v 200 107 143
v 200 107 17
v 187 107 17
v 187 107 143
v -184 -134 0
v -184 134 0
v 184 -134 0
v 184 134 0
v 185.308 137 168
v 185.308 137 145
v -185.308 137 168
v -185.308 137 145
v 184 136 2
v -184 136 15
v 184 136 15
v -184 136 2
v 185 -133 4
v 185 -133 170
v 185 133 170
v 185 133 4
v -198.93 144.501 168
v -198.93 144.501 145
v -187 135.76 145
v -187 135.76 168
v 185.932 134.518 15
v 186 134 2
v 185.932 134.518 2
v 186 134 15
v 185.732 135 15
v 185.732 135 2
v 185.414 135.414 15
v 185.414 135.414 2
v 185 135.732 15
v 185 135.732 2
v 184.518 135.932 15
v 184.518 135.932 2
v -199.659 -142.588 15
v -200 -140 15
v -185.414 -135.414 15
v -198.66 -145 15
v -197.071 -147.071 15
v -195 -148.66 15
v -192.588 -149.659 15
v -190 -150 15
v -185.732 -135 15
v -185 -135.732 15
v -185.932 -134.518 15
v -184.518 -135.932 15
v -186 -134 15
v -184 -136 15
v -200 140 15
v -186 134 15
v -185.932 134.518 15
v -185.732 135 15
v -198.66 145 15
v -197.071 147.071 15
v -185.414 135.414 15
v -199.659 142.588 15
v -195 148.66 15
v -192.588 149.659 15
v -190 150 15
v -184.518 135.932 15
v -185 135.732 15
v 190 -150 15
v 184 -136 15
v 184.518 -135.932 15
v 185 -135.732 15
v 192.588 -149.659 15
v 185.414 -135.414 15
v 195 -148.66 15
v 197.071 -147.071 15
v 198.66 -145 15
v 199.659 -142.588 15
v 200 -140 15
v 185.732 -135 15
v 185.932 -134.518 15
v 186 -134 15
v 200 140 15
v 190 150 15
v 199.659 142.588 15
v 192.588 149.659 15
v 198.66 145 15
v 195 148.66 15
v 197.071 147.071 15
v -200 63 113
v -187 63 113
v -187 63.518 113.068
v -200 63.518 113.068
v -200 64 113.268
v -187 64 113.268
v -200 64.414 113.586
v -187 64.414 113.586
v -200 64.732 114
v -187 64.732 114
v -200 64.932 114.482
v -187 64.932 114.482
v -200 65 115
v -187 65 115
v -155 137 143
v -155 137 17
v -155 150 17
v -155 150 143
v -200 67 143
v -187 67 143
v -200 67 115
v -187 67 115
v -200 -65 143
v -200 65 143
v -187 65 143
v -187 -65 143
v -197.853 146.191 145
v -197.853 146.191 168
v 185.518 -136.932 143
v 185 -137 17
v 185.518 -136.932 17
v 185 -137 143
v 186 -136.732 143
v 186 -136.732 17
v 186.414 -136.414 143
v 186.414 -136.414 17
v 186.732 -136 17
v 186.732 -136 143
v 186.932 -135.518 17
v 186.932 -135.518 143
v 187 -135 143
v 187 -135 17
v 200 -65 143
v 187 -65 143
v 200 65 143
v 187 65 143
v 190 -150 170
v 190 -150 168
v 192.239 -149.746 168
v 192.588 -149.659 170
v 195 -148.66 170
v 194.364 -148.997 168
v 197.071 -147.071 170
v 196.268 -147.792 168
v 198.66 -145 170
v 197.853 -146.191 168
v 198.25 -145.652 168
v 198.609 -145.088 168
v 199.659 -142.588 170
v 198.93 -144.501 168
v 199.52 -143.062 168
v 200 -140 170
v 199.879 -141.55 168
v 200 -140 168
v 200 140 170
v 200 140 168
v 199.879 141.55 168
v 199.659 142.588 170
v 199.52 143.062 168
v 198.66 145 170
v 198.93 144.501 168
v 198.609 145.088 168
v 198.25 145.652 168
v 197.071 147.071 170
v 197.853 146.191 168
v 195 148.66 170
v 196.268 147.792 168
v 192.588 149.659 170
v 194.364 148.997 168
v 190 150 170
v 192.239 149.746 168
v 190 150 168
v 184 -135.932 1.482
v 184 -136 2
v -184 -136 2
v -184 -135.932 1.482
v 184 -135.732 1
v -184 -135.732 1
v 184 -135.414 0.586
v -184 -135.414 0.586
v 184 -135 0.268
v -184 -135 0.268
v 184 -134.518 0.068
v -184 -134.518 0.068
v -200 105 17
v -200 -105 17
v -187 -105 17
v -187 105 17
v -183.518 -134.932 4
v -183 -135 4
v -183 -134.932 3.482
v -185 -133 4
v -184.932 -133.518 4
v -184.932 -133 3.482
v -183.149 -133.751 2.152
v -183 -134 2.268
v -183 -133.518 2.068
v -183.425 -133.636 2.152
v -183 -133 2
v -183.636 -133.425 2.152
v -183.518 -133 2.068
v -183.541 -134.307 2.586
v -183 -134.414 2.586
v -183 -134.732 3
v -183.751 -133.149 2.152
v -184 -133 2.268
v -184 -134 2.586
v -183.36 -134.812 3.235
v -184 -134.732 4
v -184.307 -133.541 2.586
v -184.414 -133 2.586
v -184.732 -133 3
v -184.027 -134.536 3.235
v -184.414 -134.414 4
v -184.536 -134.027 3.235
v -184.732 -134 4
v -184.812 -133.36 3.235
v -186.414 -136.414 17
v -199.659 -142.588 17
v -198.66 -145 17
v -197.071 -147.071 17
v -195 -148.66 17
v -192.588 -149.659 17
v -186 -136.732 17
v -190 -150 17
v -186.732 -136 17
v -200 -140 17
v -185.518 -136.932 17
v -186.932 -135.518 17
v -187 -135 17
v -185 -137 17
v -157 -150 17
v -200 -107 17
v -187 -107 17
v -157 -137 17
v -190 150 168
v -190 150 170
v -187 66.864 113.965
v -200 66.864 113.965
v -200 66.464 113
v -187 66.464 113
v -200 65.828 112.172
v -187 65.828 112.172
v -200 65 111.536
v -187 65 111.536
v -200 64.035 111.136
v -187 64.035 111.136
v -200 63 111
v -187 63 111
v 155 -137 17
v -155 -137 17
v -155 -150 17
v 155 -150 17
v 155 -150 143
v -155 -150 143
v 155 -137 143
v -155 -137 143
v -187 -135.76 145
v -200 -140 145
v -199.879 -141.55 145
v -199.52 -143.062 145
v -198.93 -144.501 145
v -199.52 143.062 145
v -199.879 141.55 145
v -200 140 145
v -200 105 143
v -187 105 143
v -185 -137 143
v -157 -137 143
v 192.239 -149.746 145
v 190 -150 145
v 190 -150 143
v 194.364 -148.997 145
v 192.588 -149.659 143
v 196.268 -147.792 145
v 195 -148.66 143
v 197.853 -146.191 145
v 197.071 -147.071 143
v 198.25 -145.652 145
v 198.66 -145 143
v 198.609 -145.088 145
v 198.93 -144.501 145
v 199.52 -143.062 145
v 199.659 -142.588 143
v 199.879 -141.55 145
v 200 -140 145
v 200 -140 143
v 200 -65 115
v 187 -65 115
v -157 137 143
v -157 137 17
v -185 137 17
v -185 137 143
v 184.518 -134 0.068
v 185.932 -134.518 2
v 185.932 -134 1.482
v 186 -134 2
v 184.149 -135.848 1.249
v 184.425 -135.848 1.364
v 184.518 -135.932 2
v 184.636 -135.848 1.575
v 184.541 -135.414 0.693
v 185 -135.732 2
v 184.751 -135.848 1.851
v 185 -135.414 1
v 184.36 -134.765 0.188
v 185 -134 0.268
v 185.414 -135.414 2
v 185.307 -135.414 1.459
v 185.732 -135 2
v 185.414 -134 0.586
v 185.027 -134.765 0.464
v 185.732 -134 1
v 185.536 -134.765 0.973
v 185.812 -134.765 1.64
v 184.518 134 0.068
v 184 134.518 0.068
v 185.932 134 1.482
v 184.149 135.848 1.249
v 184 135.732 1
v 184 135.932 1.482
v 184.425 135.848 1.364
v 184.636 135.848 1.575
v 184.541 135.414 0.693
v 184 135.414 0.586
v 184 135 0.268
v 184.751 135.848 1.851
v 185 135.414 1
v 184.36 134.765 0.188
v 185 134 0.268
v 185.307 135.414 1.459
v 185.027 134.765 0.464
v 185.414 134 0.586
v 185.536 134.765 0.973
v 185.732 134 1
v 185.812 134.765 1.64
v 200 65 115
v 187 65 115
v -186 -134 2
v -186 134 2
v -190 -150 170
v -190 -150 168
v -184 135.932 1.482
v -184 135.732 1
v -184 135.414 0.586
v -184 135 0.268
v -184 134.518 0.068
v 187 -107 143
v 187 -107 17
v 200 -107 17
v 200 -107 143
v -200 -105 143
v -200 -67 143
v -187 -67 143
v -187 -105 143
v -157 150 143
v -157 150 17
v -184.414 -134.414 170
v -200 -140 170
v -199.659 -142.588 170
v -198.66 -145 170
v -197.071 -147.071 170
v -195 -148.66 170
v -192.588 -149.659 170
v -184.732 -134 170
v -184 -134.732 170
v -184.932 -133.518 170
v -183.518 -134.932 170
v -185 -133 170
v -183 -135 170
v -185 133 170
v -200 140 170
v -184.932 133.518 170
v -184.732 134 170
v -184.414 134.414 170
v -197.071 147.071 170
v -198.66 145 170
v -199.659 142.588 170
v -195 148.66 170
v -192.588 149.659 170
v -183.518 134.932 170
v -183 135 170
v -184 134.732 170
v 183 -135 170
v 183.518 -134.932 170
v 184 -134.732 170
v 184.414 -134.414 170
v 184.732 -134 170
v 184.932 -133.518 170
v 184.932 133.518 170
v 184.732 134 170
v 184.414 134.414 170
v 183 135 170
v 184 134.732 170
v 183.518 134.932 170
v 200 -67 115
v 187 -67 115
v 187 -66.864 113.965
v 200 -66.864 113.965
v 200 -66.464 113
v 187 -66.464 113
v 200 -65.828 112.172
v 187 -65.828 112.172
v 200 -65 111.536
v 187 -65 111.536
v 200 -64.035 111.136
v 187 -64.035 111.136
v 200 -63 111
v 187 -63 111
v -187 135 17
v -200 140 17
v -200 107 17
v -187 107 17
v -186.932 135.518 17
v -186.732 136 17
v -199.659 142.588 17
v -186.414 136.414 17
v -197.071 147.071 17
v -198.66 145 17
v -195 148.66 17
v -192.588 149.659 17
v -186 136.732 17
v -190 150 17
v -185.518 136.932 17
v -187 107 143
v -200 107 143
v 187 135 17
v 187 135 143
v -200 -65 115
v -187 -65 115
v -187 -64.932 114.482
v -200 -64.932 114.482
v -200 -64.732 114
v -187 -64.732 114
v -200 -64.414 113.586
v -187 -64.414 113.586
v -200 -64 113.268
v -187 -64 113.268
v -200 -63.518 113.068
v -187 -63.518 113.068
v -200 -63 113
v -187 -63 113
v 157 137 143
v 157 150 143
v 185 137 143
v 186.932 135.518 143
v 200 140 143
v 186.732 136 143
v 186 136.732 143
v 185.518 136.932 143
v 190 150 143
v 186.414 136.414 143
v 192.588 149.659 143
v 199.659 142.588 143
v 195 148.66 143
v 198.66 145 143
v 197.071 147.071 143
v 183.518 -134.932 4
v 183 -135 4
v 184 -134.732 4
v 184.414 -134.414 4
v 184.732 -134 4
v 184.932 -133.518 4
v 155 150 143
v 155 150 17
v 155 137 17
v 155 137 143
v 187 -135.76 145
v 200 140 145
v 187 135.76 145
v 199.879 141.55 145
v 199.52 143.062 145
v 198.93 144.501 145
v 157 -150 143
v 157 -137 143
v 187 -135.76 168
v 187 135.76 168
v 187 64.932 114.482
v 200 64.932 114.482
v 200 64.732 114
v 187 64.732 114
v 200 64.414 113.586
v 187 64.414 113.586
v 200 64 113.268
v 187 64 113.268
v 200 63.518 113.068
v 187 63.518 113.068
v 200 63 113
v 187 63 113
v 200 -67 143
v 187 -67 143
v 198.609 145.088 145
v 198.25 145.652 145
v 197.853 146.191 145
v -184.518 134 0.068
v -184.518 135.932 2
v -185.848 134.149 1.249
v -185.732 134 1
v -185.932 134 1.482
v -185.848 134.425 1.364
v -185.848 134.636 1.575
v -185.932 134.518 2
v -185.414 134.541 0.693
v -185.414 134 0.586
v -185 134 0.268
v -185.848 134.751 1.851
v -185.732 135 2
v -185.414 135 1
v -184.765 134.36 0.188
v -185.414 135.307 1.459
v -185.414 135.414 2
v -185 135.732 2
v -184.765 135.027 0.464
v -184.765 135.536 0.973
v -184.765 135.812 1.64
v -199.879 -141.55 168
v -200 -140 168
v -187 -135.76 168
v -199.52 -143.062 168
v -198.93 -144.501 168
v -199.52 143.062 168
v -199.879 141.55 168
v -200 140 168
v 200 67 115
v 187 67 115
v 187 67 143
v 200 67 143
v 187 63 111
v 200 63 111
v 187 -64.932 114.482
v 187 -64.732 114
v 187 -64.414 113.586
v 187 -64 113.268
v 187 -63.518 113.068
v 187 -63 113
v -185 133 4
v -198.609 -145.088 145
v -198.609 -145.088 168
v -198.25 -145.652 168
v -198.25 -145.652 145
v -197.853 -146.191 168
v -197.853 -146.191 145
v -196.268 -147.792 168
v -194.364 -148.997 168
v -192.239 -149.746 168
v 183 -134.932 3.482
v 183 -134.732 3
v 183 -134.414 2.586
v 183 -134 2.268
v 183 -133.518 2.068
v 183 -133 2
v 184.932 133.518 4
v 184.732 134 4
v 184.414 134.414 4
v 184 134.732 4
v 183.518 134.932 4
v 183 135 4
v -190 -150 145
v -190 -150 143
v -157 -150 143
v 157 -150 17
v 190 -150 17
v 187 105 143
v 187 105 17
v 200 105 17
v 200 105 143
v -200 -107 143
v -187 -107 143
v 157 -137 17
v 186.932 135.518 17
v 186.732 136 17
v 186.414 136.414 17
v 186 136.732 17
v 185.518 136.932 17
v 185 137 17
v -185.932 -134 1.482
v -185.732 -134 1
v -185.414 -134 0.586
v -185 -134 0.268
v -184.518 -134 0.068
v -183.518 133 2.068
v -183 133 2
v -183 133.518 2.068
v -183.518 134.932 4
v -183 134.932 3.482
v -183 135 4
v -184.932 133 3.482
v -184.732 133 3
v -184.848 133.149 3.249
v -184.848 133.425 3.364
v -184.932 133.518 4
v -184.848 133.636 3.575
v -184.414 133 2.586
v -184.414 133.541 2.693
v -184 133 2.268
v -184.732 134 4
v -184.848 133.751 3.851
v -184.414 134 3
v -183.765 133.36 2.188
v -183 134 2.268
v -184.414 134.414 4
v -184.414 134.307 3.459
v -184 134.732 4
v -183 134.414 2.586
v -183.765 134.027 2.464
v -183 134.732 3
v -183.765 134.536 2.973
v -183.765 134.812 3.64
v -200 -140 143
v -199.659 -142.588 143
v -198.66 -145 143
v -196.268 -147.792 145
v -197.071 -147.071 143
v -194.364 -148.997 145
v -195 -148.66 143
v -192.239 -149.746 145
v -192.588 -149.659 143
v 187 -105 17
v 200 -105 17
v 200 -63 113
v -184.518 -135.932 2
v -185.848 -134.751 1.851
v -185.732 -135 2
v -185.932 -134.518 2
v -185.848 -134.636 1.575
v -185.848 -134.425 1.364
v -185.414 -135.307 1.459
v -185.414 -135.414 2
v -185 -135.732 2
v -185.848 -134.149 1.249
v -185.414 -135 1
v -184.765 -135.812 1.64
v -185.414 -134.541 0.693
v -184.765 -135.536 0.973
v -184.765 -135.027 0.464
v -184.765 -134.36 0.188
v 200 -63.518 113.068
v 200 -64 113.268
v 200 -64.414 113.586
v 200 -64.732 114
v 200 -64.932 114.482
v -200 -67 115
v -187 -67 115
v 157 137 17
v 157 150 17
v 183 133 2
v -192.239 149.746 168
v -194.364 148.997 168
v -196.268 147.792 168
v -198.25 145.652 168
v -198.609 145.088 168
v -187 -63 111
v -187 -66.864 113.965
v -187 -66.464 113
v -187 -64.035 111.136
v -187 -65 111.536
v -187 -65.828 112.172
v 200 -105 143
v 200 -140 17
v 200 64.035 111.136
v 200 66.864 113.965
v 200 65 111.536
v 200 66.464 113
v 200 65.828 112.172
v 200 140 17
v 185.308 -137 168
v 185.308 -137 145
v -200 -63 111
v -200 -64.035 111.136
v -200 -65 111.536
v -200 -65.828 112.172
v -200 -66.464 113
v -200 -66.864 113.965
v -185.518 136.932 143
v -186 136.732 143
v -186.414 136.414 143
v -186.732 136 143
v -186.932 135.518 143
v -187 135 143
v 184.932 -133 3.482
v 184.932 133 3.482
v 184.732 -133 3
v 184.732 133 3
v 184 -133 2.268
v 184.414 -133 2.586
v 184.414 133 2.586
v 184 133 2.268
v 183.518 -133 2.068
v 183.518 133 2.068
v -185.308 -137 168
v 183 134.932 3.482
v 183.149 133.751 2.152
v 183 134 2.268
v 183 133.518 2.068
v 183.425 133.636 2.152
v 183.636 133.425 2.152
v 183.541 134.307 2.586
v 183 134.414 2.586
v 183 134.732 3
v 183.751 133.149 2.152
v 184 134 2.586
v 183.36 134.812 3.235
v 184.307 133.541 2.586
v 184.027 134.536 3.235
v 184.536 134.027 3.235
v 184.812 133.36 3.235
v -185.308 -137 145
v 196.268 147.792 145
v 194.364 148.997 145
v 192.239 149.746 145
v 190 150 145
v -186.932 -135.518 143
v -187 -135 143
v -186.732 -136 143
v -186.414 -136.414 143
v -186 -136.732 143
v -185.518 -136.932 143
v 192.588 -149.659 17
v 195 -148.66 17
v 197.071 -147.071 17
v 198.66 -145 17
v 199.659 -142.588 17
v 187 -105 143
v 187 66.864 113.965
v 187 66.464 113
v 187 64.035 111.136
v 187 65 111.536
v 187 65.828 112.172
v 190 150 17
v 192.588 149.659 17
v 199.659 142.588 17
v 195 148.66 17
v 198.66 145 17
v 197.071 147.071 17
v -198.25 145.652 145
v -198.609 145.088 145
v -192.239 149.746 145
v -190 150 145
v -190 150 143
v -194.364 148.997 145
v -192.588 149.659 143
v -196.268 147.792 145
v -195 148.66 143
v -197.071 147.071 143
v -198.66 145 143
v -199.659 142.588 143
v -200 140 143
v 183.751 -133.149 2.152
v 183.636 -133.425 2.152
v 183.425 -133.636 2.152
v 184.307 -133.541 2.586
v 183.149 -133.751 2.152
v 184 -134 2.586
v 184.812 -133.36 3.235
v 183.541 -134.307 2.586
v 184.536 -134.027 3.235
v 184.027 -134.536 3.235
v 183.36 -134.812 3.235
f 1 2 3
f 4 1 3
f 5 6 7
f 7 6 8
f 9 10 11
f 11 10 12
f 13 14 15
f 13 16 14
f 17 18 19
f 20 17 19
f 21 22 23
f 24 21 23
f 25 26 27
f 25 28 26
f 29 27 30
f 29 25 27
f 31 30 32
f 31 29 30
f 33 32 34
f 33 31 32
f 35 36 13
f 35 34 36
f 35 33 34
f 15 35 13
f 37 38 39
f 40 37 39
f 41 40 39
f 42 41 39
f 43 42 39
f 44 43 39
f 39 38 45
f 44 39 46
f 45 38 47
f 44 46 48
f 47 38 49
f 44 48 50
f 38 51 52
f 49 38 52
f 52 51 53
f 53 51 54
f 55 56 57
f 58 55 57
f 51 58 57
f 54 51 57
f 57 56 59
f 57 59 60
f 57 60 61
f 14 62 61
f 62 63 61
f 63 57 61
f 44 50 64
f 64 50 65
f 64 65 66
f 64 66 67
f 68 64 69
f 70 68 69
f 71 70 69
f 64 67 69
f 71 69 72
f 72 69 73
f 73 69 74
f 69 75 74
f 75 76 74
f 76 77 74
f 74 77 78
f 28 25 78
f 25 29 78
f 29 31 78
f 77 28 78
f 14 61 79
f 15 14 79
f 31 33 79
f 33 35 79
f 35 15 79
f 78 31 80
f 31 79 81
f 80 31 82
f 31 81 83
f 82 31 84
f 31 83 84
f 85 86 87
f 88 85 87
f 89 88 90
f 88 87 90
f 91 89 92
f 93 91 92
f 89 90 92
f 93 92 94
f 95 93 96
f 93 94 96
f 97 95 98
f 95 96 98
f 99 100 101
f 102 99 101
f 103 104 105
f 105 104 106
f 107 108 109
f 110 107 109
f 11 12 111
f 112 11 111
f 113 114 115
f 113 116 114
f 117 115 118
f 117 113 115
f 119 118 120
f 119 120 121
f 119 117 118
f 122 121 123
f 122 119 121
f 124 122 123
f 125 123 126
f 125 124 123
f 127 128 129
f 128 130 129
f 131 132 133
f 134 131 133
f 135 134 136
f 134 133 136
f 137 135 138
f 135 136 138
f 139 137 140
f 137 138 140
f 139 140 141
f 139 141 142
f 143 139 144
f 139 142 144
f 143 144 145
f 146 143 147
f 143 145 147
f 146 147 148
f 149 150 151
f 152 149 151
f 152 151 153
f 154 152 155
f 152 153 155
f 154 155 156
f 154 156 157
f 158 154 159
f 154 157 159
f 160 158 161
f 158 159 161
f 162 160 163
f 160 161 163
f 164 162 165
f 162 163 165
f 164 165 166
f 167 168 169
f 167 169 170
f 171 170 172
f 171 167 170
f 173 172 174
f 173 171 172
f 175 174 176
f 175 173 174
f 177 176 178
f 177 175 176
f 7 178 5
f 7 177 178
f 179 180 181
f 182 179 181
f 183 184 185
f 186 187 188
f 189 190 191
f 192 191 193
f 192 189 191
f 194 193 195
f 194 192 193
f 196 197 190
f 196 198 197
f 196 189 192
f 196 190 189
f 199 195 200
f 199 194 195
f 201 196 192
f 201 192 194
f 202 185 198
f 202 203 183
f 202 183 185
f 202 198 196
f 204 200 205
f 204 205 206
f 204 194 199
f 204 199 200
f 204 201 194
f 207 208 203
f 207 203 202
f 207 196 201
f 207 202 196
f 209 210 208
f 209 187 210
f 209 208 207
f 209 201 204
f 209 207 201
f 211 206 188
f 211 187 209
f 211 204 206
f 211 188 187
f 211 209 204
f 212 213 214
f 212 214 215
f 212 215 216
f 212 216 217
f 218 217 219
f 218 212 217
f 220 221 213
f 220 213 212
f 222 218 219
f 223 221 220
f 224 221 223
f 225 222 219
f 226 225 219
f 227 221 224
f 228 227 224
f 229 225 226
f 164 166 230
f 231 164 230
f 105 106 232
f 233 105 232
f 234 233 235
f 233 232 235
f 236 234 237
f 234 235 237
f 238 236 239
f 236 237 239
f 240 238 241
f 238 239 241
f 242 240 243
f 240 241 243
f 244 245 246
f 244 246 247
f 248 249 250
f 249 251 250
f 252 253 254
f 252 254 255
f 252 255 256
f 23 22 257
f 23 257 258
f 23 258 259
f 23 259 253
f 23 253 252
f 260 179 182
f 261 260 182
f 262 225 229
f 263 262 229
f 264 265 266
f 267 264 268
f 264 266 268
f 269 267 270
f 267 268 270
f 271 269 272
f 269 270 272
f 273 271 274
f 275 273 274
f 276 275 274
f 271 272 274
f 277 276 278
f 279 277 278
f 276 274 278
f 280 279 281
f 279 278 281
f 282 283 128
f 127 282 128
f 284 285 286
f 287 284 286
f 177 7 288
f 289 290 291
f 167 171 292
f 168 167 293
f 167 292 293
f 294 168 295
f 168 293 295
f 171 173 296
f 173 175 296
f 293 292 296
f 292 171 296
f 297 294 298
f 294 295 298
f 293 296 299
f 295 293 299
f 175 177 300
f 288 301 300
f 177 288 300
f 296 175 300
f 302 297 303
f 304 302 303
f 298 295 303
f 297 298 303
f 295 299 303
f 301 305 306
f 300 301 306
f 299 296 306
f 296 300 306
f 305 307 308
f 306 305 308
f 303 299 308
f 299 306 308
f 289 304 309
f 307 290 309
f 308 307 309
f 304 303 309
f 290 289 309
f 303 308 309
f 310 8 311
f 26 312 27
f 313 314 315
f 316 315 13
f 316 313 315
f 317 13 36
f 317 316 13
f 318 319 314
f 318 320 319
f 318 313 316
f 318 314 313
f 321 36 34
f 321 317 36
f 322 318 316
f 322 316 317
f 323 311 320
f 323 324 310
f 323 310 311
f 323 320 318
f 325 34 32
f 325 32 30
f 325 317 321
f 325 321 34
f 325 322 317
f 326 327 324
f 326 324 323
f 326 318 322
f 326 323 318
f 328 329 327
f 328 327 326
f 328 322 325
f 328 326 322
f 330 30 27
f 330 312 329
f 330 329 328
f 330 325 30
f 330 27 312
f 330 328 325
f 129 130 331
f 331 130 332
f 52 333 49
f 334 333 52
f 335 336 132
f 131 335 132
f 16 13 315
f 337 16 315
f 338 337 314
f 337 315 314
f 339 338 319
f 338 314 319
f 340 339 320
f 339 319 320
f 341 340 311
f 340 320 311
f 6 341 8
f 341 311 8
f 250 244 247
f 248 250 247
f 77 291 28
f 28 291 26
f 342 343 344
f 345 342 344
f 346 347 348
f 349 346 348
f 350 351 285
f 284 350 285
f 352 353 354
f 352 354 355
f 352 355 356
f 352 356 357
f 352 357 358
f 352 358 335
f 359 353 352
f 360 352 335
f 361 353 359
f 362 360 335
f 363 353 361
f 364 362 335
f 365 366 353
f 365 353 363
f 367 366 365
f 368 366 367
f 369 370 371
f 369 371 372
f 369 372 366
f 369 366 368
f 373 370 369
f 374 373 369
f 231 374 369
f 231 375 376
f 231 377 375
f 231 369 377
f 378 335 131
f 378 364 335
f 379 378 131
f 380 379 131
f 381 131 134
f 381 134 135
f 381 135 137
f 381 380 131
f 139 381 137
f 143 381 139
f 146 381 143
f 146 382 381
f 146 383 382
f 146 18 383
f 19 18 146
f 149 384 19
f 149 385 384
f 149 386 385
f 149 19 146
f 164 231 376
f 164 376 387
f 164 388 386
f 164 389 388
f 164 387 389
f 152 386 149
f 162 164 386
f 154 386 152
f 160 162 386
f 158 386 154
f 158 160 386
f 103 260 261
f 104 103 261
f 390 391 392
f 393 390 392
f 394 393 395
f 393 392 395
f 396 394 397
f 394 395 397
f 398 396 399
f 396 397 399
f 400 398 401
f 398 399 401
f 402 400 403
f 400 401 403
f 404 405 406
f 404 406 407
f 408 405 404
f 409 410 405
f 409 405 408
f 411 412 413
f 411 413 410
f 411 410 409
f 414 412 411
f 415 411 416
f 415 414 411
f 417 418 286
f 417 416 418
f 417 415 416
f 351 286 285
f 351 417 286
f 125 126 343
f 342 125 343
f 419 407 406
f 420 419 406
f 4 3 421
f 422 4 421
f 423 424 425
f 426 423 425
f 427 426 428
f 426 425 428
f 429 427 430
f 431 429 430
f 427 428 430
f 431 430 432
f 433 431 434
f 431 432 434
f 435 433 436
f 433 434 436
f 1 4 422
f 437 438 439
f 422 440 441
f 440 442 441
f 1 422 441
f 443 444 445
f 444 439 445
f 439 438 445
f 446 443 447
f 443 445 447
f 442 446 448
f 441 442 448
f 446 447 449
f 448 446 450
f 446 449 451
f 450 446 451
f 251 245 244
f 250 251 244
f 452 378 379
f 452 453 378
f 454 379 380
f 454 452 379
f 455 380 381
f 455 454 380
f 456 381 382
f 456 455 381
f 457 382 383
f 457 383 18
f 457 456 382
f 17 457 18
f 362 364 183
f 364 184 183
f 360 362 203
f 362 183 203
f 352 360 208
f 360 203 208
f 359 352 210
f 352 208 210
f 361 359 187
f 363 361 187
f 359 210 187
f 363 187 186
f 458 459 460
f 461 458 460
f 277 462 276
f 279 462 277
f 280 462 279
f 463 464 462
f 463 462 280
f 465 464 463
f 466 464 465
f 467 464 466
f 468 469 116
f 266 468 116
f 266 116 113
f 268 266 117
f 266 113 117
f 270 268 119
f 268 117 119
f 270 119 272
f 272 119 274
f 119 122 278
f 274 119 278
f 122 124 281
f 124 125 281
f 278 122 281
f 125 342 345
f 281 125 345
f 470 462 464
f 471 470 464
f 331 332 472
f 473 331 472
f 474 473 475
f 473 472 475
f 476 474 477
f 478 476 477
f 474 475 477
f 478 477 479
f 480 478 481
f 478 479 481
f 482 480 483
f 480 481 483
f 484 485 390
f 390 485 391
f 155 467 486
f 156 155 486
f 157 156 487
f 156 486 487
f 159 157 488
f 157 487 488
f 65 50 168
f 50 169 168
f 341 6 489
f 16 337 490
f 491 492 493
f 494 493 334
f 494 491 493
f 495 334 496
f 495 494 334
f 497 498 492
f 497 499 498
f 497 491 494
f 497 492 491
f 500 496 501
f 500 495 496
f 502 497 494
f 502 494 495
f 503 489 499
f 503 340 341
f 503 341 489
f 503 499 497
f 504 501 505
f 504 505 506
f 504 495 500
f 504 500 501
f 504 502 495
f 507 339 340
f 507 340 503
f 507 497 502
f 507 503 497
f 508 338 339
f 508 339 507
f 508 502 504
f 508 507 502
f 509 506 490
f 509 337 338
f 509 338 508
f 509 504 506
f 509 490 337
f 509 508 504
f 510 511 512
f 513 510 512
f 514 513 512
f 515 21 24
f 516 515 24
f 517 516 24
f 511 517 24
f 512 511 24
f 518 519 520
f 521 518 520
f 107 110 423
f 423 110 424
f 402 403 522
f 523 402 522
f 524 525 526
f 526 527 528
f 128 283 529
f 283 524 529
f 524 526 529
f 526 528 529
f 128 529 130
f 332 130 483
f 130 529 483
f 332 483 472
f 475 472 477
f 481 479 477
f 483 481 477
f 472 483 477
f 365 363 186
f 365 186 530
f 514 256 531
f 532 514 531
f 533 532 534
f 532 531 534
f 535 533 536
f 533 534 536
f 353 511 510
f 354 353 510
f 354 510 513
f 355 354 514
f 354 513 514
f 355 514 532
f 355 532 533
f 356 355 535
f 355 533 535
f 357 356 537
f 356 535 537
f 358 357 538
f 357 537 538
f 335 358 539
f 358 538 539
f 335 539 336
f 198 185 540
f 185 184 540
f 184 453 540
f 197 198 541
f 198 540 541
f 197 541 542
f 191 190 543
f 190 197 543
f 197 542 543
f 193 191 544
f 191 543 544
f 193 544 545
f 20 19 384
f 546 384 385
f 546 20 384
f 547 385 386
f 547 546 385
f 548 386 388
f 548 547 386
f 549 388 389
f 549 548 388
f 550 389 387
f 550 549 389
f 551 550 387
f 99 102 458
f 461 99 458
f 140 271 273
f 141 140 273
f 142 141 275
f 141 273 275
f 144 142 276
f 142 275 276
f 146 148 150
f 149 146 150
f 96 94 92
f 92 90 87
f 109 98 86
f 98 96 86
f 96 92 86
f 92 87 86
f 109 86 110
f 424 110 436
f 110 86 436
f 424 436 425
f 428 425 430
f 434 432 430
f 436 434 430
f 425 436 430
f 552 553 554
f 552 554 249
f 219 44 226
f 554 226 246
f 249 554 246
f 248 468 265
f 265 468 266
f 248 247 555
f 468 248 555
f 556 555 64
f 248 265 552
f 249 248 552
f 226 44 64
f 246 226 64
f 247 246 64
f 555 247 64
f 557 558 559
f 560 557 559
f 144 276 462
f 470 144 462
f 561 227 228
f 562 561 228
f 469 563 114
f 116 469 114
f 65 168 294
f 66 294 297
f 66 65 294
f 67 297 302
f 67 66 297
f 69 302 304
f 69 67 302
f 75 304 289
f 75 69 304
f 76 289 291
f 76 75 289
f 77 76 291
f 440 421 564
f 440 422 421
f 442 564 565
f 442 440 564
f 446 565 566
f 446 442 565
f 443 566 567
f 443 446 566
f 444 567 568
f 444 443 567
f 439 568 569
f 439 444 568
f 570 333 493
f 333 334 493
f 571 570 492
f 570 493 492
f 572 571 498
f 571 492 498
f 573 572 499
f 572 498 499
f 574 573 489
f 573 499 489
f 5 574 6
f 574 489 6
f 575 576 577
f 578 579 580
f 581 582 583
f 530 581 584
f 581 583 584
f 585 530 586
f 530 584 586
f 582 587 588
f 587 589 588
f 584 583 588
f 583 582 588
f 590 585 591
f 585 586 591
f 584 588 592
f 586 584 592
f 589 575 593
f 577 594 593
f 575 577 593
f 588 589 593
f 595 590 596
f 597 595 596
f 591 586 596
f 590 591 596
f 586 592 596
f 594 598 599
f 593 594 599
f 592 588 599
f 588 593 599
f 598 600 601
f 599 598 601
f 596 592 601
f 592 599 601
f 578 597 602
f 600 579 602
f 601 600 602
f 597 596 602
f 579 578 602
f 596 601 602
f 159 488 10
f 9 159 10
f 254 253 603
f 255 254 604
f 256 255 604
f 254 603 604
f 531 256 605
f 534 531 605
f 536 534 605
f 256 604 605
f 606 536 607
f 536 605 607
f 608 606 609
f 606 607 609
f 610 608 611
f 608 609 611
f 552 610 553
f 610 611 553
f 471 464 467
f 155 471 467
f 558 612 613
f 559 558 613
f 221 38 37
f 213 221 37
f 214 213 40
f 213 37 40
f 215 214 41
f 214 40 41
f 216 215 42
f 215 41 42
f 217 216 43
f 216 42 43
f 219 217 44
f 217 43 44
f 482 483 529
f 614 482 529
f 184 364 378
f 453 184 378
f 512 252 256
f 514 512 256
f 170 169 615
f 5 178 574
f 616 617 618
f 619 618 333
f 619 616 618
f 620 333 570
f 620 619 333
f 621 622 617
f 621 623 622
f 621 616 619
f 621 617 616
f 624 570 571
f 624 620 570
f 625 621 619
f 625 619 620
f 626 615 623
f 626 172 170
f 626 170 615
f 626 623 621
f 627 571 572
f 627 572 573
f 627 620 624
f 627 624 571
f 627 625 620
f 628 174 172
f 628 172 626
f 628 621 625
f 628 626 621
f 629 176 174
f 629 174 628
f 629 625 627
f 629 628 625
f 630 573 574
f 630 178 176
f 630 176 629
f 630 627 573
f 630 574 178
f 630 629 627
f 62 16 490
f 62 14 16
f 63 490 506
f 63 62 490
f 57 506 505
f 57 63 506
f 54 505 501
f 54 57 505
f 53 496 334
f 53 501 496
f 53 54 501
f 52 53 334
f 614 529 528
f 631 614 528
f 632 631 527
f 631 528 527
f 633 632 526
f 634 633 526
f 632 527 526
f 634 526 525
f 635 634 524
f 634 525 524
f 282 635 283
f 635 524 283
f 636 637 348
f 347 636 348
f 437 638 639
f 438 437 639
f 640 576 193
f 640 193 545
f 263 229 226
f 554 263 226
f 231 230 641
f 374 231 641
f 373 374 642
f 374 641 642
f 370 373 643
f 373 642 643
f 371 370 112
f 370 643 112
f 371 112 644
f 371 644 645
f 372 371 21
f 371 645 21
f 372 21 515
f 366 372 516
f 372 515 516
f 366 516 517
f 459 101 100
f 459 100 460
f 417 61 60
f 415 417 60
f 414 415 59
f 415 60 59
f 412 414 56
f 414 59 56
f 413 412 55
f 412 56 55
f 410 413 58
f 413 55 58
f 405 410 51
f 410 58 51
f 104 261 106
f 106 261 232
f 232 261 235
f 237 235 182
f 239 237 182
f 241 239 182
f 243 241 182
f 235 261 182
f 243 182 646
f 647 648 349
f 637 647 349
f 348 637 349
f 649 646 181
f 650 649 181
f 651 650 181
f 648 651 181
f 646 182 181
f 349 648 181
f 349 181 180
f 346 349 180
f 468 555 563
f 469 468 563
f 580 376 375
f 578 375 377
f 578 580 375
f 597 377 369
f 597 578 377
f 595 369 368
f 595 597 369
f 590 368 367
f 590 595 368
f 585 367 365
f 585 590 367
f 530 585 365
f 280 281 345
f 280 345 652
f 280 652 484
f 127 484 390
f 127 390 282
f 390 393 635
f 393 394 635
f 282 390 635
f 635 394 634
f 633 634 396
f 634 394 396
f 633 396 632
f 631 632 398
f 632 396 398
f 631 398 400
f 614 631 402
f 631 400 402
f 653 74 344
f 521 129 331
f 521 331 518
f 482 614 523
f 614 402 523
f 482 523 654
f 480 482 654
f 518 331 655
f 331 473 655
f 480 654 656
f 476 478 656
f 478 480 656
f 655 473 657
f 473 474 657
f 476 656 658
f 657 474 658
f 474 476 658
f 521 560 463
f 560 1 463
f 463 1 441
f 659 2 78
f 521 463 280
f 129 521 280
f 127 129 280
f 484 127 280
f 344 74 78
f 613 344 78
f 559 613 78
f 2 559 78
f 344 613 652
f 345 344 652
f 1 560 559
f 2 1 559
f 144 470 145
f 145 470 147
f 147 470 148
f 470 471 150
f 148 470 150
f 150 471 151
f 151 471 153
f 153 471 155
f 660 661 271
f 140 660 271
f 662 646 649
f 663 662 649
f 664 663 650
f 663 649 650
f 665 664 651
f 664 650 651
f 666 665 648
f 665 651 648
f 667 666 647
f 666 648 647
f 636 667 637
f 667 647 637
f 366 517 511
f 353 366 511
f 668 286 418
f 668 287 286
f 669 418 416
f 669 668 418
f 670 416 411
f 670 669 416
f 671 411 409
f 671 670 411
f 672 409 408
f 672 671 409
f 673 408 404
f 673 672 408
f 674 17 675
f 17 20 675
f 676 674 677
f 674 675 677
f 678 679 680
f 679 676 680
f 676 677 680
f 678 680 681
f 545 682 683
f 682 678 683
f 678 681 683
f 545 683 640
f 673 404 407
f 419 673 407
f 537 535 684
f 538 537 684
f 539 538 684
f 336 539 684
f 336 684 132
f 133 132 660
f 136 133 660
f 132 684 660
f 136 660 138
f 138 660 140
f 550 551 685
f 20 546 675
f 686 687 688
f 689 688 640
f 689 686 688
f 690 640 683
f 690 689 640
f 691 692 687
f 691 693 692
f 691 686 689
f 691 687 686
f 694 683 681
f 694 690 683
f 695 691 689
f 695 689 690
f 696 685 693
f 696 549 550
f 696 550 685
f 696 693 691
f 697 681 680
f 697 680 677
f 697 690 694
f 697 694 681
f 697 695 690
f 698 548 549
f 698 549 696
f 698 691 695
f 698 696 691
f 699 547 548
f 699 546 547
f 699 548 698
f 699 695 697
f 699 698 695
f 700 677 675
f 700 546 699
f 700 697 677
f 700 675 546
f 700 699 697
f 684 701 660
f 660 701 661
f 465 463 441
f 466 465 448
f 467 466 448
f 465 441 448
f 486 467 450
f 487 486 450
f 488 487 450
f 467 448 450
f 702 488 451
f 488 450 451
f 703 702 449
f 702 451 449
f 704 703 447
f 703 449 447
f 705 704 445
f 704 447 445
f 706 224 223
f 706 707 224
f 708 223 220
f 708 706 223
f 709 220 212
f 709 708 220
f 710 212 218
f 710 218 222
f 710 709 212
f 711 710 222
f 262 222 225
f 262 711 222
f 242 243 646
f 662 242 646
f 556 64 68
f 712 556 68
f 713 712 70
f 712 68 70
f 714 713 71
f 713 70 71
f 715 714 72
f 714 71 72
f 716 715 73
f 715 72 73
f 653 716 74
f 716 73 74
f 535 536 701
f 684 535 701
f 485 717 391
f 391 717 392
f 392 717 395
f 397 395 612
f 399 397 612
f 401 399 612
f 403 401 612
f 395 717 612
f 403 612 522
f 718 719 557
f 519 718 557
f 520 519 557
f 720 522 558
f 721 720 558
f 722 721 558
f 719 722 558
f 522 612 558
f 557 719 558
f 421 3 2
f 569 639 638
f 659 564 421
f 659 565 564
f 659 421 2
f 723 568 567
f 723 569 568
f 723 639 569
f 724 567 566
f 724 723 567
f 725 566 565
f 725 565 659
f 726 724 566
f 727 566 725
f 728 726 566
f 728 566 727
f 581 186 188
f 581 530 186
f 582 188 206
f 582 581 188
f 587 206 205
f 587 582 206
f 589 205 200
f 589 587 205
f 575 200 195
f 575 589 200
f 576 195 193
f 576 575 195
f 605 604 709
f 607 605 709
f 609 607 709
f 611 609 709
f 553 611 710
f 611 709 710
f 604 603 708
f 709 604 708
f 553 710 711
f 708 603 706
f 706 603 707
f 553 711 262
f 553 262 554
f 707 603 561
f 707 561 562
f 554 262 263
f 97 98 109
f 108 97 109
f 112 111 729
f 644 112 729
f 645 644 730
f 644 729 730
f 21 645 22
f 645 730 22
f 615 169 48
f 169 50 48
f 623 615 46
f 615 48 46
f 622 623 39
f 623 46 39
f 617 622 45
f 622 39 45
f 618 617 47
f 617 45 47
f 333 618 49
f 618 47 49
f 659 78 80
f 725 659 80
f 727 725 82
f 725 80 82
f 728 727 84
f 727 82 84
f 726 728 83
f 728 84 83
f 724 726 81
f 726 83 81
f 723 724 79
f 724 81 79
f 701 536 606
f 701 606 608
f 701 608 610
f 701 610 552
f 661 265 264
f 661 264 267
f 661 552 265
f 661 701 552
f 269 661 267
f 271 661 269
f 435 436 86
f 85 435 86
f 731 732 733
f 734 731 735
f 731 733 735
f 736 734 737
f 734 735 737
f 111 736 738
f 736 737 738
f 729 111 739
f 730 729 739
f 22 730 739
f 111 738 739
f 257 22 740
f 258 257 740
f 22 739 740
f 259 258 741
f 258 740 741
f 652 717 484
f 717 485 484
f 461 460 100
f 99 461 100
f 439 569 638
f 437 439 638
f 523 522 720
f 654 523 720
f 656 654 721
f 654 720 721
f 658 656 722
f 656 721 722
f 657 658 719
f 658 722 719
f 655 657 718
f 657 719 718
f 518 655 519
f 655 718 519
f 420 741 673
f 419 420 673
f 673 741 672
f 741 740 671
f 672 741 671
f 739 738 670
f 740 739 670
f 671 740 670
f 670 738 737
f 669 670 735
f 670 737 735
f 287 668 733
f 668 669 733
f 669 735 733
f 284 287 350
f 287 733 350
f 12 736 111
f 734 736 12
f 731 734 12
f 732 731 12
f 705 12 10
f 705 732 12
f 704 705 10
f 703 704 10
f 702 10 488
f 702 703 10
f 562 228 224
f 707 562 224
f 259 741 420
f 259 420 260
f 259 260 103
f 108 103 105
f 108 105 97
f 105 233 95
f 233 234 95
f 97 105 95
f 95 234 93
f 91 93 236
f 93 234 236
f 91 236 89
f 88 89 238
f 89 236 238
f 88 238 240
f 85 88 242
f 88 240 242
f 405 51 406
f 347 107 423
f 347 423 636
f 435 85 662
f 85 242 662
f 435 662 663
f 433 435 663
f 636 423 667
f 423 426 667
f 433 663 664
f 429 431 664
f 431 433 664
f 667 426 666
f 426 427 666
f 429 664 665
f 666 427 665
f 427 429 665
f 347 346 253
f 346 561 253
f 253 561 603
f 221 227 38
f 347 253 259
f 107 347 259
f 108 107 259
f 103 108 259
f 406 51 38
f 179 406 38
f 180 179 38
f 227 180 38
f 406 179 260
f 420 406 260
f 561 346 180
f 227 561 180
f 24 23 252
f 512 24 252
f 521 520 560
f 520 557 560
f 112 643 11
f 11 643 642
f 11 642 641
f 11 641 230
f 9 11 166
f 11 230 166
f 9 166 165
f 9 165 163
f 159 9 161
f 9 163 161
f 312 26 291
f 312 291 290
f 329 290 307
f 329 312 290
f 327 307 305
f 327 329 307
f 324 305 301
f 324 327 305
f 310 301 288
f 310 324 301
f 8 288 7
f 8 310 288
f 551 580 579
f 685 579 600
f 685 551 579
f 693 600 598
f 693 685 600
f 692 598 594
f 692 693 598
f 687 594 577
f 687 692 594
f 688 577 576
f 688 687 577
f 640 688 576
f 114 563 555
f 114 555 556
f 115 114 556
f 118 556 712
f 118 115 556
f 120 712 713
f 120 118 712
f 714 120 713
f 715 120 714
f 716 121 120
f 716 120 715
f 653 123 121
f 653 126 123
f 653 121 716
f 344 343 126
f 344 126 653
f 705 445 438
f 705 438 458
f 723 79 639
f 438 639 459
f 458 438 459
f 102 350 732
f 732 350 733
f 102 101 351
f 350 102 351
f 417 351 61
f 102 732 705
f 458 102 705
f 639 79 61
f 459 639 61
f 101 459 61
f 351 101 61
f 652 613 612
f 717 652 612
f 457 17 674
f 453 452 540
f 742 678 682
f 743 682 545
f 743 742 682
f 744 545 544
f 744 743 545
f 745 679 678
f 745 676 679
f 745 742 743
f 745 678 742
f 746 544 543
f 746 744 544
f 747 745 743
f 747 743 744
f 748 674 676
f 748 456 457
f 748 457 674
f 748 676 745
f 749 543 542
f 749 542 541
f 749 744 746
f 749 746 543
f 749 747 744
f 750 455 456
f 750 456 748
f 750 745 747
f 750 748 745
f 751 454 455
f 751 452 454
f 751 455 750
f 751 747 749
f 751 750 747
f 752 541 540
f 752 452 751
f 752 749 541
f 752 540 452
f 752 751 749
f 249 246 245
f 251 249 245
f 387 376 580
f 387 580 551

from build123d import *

# Parameters (mm, degrees)
F0_W      = 372
F0_H      = 272
F1_DEPTH  = 15
F2_W      = 372
F2_H      = 272
F3_DEPTH  = 2
F5_DEPTH  = 126
F7_DEPTH  = 2
F9_DEPTH  = 23
F11_DEPTH = 2
F12_W     = 370
F12_H     = 270
F13_DEPTH = 168
F15_DEPTH = 13
F17_DEPTH = 13
F18_R     = 2


with BuildPart() as f1:
    # F0 (on Top) → F1 (new body)
    with BuildSketch(Plane.XY):
        Rectangle(F0_W, F0_H)
    extrude(amount=F1_DEPTH)

    # F2 (on face) → F3 (join)
    with BuildSketch(Plane.XY.offset(15)):
        with BuildLine():
            Line((-190, -150), (190, -150))
            ThreePointArc((190, -150), (197.0710678119, -147.0710678119), (200, -140))
            Line((200, -140), (200, 140))
            ThreePointArc((200, 140), (197.0710678119, 147.0710678119), (190, 150))
            Line((190, 150), (-190, 150))
            ThreePointArc((-190, 150), (-197.0710678119, 147.0710678119), (-200, 140))
            Line((-200, 140), (-200, -140))
            ThreePointArc((-200, -140), (-197.0710678119, -147.0710678119), (-190, -150))
        make_face()
        Rectangle(F2_W, F2_H, mode=Mode.SUBTRACT)
        Rectangle(F2_W, F2_H)
    extrude(amount=F3_DEPTH)

    # F4 (on face) → F5 (join)
    with BuildSketch(Plane.XY.offset(17)):
        Polygon((157, -137), (187, -137), (187, -107), (200, -107), (200, -105), (187, -105), (187, 105), (200, 105), (200, 107), (187, 107), (187, 137), (157, 137), (157, 150), (155, 150), (155, 137), (-155, 137), (-155, 150), (-157, 150), (-157, 137), (-187, 137), (-187, 107), (-200, 107), (-200, 105), (-187, 105), (-187, -105), (-200, -105), (-200, -107), (-187, -107), (-187, -137), (-157, -137), (-157, -150), (-155, -150), (-155, -137), (155, -137), (155, -150), (157, -150), align=None)
    extrude(amount=F5_DEPTH)

    # F6 (on face) → F7 (join)
    with BuildSketch(Plane.XY.offset(143)):
        with BuildLine():
            Line((190, 150), (-190, 150))
            ThreePointArc((-190, 150), (-197.0710678119, 147.0710678119), (-200, 140))
            Line((-200, 140), (-200, -140))
            ThreePointArc((-200, -140), (-197.0710678119, -147.0710678119), (-190, -150))
            Line((-190, -150), (190, -150))
            ThreePointArc((190, -150), (197.0710678119, -147.0710678119), (200, -140))
            Line((200, -140), (200, 140))
            ThreePointArc((200, 140), (197.0710678119, 147.0710678119), (190, 150))
        make_face()
    extrude(amount=F7_DEPTH)

    # F8 (on face) → F9 (join)
    with BuildSketch(Plane.XY.offset(145)):
        with BuildLine():
            Line((-185.3079227659, -137), (185.3079227659, -137))
            Line((185.3079227659, -137), (197.8531877713, -146.1909160735))
            ThreePointArc((197.8531877713, -146.1909160735), (198.4340605379, -145.3727667773), (198.9300207482, -144.5005254622))
            Line((198.9300207482, -144.5005254622), (187, -135.7603498338))
            Line((187, -135.7603498338), (187, 135.7603498338))
            Line((187, 135.7603498338), (198.9300207482, 144.5005254622))
            ThreePointArc((198.9300207482, 144.5005254622), (198.4340605379, 145.3727667773), (197.8531877713, 146.1909160735))
            Line((197.8531877713, 146.1909160735), (185.3079227659, 137))
            Line((185.3079227659, 137), (-185.3079227659, 137))
            Line((-185.3079227659, 137), (-197.8531877713, 146.1909160735))
            ThreePointArc((-197.8531877713, 146.1909160735), (-198.4340605379, 145.3727667773), (-198.9300207482, 144.5005254622))
            Line((-198.9300207482, 144.5005254622), (-187, 135.7603498338))
            Line((-187, 135.7603498338), (-187, -135.7603498338))
            Line((-187, -135.7603498338), (-198.9300207482, -144.5005254622))
            ThreePointArc((-198.9300207482, -144.5005254622), (-198.4340605379, -145.3727667773), (-197.8531877713, -146.1909160735))
            Line((-197.8531877713, -146.1909160735), (-185.3079227659, -137))
        make_face()
    extrude(amount=F9_DEPTH)

    # F10 (on face) → F11 (join)
    with BuildSketch(Plane.XY.offset(168)):
        with BuildLine():
            Line((-190, -150), (190, -150))
            ThreePointArc((190, -150), (197.0710678119, -147.0710678119), (200, -140))
            Line((200, -140), (200, 140))
            ThreePointArc((200, 140), (197.0710678119, 147.0710678119), (190, 150))
            Line((190, 150), (-190, 150))
            ThreePointArc((-190, 150), (-197.0710678119, 147.0710678119), (-200, 140))
            Line((-200, 140), (-200, -140))
            ThreePointArc((-200, -140), (-197.0710678119, -147.0710678119), (-190, -150))
        make_face()
    extrude(amount=F11_DEPTH)

    # F12 (on face) → F13 (cut)
    with BuildSketch(Plane.XY.offset(170)):
        Rectangle(F12_W, F12_H)
    extrude(amount=-F13_DEPTH, mode=Mode.SUBTRACT)

    # F14 (on face) → F15 (join, through all)
    with BuildSketch(Plane(origin=(-187, 0, 0), x_dir=(0, -1, 0), z_dir=(-1, 0, 0))):
        with BuildLine():
            Line((-63, 111), (63, 111))
            ThreePointArc((63, 111), (65.8284271247, 112.1715728753), (67, 115))
            Line((67, 115), (67, 143))
            Line((67, 143), (65, 143))
            Line((65, 143), (65, 115))
            ThreePointArc((65, 115), (64.4142135624, 113.5857864376), (63, 113))
            Line((63, 113), (-63, 113))
            ThreePointArc((-63, 113), (-64.4142135624, 113.5857864376), (-65, 115))
            Line((-65, 115), (-65, 143))
            Line((-65, 143), (-67, 143))
            Line((-67, 143), (-67, 115))
            ThreePointArc((-67, 115), (-65.8284271247, 112.1715728753), (-63, 111))
        make_face()
    extrude(amount=F15_DEPTH)

    # F16 (on face) → F17 (join, through all)
    with BuildSketch(Plane.YZ.offset(187)):
        with BuildLine():
            ThreePointArc((63, 111), (65.8284271247, 112.1715728753), (67, 115))
            Line((67, 115), (67, 143))
            Line((67, 143), (65, 143))
            Line((65, 143), (65, 115))
            ThreePointArc((65, 115), (64.4142135624, 113.5857864376), (63, 113))
            Line((63, 113), (-63, 113))
            ThreePointArc((-63, 113), (-64.4142135624, 113.5857864376), (-65, 115))
            Line((-65, 115), (-65, 143))
            Line((-65, 143), (-67, 143))
            Line((-67, 143), (-67, 115))
            ThreePointArc((-67, 115), (-65.8284271247, 112.1715728753), (-63, 111))
            Line((-63, 111), (63, 111))
        make_face()
    extrude(amount=F17_DEPTH)

    # F18
    f18_edges = [f1.edges().sort_by_distance(p)[0] for p in [
        (-185, -135, 86),
        (185, -135, 86),
        (185, 135, 86),
        (0, 135, 2),
        (185, 0, 2),
        (0, -135, 2),
        (-185, 0, 2),
        (-185, 135, 86),
        (187, -137, 80),
        (187, 137, 80),
        (-187, 137, 80),
        (-187, -137, 80),
        (186, 0, 0),
        (0, 136, 0),
        (186, 136, 7.5),
        (0, -136, 0),
        (186, -136, 7.5),
        (-186, -136, 7.5),
        (-186, 0, 0),
        (-186, 136, 7.5),
    ]]
    fillet(f18_edges, radius=F18_R)


solid = f1.part
